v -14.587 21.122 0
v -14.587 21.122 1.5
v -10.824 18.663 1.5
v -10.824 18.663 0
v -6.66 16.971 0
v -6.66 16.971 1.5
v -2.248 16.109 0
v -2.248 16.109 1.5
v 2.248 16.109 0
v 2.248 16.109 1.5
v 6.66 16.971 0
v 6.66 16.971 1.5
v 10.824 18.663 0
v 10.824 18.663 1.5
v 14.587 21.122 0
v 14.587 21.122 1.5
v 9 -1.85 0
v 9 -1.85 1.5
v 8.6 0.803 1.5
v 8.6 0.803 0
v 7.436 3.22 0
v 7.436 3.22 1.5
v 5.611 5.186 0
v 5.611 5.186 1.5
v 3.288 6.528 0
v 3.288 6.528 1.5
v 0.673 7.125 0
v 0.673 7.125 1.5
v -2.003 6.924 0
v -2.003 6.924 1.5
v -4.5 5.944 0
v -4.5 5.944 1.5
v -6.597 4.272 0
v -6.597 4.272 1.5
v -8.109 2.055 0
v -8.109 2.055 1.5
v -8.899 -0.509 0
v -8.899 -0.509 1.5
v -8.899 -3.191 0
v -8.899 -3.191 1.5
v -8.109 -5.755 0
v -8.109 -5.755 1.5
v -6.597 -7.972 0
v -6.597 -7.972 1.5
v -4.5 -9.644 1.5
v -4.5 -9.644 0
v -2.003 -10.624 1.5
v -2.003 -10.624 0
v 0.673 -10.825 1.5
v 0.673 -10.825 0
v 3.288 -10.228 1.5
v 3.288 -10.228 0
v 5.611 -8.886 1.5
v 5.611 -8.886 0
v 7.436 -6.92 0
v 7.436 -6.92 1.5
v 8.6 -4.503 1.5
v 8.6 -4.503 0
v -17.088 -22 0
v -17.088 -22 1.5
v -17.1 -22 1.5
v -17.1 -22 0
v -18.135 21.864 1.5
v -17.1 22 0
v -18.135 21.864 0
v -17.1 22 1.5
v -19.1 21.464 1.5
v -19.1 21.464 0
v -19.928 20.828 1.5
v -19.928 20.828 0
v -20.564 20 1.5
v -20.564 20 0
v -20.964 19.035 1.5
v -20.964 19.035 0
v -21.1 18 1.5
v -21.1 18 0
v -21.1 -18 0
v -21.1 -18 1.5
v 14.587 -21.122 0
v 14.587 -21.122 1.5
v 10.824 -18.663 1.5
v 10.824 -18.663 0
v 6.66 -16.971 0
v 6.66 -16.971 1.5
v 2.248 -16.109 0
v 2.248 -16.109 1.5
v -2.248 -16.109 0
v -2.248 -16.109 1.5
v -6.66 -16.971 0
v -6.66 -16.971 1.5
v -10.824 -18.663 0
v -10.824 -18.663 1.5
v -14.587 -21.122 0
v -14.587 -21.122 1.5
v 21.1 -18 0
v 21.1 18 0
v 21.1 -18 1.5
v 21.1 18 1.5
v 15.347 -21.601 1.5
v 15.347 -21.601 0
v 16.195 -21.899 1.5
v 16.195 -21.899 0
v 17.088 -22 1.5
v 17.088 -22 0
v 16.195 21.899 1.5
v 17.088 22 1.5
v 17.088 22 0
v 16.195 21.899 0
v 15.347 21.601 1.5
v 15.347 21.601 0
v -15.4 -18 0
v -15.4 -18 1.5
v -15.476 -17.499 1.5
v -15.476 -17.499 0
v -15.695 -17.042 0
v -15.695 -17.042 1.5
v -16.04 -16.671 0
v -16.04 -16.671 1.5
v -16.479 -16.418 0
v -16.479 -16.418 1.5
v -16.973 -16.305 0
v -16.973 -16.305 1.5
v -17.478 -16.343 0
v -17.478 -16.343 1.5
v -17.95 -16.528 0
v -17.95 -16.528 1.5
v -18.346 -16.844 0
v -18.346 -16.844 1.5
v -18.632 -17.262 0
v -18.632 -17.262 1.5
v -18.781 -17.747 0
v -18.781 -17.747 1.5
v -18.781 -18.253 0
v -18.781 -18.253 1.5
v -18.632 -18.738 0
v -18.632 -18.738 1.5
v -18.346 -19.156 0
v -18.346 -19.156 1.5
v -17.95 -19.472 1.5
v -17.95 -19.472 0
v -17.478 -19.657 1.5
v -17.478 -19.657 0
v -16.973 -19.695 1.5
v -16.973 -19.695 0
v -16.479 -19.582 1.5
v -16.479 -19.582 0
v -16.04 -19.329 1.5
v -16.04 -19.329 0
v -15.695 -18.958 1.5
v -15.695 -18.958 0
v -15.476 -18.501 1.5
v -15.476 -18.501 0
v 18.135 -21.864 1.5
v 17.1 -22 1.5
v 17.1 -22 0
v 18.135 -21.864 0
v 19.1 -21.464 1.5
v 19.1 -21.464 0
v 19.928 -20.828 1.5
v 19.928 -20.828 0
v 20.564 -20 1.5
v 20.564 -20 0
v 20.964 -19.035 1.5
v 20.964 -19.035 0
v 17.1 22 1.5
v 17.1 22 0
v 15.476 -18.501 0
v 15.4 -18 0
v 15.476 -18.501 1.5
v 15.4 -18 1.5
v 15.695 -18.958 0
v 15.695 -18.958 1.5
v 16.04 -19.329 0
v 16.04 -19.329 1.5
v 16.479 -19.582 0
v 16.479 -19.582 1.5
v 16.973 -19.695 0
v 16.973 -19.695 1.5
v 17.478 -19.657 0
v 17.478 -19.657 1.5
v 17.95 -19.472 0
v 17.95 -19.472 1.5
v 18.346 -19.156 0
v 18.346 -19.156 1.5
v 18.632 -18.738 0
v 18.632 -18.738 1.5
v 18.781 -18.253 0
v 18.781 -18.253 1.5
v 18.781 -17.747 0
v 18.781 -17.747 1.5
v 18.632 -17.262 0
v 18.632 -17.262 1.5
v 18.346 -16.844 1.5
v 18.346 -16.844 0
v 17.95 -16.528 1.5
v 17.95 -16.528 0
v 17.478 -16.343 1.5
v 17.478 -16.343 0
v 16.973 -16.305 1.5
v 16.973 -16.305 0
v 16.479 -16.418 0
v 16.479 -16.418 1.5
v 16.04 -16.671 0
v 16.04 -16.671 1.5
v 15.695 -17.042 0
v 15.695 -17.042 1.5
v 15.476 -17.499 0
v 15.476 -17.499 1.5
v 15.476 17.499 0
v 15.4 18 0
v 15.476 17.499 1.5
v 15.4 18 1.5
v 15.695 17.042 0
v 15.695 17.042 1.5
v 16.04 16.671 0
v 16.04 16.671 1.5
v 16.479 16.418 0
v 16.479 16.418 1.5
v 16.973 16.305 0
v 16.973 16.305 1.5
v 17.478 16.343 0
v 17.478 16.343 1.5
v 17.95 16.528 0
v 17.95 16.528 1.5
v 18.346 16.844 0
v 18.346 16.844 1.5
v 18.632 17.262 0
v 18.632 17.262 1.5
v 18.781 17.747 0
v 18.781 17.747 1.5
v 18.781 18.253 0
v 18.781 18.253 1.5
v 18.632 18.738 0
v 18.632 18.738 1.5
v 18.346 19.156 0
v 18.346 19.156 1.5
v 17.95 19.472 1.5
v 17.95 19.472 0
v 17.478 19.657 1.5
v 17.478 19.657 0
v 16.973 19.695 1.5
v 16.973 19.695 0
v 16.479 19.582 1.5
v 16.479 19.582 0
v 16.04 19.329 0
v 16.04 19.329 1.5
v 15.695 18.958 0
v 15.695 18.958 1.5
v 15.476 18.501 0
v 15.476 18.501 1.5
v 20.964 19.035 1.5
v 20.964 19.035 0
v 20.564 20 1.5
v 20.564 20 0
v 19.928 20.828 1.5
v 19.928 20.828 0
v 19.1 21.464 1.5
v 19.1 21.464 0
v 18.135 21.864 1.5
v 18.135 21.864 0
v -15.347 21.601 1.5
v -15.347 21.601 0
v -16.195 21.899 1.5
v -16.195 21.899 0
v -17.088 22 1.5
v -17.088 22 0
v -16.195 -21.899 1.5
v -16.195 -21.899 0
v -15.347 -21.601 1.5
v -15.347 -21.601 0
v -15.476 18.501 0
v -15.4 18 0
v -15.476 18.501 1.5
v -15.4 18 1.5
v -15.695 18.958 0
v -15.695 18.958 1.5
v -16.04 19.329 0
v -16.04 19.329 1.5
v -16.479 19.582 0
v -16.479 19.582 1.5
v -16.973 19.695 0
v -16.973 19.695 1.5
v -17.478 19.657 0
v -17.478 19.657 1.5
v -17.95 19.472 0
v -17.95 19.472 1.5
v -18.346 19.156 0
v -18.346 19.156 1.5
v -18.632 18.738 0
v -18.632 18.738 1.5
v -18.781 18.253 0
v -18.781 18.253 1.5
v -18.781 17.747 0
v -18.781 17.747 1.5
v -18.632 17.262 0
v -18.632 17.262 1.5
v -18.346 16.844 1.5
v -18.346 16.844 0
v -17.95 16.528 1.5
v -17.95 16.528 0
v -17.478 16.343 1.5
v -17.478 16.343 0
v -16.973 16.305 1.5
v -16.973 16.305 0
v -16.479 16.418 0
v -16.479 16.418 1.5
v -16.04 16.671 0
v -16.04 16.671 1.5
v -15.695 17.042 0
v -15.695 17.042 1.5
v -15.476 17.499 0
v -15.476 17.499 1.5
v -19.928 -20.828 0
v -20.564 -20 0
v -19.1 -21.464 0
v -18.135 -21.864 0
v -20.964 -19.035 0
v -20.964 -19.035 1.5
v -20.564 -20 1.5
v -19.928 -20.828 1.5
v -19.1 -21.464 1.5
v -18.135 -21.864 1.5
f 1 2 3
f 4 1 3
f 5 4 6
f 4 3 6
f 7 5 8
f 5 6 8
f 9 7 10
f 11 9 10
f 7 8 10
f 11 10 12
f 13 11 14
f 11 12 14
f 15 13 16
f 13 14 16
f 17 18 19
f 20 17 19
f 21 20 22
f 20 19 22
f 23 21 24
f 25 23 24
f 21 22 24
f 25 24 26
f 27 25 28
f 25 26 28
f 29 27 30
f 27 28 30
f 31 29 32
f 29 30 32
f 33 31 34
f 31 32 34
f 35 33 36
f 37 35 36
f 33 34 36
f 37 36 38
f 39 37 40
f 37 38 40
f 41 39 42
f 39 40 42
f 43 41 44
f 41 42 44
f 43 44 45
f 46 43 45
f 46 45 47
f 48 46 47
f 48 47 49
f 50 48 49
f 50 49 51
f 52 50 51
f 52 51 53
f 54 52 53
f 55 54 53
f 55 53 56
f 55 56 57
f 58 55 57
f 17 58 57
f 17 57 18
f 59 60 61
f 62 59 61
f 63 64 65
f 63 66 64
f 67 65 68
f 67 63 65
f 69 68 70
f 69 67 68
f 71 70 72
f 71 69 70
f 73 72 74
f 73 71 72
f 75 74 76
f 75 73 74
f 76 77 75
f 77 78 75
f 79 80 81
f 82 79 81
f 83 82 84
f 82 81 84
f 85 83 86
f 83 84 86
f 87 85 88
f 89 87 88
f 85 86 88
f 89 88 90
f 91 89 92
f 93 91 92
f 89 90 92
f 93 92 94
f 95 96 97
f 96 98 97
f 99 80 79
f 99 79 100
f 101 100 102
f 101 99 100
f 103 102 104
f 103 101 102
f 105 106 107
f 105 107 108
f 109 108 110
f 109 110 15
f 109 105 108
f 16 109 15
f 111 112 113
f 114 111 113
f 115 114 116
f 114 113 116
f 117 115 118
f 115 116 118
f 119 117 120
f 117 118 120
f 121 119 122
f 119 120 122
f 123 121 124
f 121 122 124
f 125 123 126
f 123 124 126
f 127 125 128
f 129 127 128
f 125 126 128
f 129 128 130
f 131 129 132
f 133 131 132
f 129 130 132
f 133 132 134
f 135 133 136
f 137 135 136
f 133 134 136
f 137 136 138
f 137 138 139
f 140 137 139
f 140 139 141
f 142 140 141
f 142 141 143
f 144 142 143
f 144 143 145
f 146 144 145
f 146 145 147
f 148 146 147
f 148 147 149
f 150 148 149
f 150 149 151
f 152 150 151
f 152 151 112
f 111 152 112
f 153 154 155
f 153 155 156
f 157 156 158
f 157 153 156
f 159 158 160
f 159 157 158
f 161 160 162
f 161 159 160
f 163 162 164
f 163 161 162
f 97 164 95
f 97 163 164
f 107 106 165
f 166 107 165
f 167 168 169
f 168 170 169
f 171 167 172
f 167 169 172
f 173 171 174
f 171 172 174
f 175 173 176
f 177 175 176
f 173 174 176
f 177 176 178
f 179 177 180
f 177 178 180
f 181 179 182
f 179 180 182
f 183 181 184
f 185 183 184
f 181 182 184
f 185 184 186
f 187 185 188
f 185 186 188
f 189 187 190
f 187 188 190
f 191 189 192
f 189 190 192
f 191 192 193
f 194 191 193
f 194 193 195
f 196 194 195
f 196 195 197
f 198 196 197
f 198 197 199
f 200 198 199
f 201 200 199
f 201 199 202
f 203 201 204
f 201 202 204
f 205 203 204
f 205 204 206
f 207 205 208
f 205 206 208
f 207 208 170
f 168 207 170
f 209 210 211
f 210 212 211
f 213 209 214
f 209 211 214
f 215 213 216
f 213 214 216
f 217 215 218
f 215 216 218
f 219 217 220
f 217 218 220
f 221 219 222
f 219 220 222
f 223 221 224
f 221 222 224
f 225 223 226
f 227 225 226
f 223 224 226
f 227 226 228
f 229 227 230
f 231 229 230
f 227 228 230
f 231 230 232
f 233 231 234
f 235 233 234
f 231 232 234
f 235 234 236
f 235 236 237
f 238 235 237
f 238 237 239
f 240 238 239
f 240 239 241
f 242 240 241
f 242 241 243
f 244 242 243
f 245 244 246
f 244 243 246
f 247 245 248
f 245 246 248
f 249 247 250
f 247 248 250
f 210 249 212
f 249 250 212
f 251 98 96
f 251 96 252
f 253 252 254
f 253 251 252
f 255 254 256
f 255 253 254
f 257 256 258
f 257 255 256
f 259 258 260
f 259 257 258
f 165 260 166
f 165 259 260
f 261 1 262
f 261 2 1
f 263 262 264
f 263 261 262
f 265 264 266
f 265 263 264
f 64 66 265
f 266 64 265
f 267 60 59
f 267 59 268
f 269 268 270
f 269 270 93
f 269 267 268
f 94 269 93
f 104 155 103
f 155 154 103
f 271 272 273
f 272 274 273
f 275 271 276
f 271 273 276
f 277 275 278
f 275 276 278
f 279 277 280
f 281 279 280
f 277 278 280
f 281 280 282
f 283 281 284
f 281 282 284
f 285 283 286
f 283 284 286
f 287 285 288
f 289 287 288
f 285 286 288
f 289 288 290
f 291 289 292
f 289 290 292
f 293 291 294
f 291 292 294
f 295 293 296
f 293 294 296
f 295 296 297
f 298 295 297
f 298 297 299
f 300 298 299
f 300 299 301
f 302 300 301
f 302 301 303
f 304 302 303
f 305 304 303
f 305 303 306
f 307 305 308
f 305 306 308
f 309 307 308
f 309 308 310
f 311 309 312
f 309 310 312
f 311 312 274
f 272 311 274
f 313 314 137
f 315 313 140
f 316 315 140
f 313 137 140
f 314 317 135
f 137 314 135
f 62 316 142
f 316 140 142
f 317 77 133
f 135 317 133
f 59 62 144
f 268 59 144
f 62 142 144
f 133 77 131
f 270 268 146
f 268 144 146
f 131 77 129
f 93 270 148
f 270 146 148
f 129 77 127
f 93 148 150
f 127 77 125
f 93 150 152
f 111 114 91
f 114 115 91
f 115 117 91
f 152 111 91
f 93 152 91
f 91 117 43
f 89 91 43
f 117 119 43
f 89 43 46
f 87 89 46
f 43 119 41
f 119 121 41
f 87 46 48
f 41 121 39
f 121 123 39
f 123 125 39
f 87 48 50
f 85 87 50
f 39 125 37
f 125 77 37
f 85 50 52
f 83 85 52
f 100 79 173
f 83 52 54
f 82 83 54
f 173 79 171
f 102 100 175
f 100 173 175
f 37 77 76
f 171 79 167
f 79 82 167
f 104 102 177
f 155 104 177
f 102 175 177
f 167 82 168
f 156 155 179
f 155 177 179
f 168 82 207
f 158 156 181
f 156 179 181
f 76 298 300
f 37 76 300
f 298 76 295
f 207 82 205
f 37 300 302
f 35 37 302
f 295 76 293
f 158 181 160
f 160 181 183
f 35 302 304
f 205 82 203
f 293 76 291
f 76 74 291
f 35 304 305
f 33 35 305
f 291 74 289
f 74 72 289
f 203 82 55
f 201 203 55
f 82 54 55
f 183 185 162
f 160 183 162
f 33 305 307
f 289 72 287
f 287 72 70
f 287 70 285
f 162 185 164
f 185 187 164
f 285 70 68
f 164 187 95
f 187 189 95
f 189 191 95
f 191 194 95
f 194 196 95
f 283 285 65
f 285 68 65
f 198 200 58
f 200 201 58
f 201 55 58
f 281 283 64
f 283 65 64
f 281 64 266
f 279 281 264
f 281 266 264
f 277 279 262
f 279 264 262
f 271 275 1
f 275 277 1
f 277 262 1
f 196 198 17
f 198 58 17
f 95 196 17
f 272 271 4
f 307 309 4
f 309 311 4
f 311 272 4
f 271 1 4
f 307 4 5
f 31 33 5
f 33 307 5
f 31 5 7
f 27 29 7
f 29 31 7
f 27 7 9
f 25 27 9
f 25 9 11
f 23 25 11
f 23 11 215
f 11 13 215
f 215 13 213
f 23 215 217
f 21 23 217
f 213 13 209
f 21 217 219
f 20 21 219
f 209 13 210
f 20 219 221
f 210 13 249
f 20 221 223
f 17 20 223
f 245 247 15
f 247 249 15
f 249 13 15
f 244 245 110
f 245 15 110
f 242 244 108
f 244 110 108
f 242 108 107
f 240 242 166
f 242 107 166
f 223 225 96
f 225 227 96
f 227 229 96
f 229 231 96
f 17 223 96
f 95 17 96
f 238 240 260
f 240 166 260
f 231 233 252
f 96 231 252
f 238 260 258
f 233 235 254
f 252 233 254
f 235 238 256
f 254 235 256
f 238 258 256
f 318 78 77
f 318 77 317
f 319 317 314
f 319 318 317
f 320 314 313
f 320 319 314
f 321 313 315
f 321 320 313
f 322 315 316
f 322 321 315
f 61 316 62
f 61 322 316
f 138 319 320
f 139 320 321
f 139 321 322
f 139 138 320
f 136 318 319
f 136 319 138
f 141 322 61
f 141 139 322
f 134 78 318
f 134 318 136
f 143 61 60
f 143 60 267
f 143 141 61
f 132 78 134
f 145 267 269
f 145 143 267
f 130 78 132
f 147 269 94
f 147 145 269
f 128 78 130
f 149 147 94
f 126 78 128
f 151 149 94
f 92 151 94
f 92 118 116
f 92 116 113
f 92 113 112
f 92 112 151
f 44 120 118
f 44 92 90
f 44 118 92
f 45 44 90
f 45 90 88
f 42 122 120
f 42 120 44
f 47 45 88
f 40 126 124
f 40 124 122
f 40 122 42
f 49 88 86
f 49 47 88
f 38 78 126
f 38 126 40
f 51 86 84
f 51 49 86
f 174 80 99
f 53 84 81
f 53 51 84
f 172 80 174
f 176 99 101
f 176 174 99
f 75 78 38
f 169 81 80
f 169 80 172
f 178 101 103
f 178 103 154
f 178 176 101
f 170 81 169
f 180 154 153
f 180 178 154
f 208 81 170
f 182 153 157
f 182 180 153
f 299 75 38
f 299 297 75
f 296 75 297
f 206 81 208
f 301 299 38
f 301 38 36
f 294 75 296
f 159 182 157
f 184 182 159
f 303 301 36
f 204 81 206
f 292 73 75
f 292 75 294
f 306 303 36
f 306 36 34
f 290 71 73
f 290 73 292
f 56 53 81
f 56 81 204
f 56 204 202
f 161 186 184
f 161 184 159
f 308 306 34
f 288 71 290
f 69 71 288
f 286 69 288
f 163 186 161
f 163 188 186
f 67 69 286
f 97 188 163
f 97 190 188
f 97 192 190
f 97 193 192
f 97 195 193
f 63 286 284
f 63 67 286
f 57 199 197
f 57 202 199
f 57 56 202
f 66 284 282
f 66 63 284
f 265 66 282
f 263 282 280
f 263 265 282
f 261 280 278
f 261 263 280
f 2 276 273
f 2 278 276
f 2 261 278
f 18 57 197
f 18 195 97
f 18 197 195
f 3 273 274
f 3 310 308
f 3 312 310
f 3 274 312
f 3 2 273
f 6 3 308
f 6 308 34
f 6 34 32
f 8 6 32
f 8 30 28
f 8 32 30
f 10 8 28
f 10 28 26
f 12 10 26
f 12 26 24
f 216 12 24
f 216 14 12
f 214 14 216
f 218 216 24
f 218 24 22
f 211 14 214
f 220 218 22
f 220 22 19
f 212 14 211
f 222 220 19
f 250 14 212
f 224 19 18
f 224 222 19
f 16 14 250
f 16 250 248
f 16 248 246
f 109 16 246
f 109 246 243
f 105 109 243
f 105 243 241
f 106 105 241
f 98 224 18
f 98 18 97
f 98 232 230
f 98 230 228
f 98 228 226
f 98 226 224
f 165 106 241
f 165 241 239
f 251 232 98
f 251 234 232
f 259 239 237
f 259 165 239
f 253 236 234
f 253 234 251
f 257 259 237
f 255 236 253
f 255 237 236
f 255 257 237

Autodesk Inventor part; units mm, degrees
ref_plane "YZ Plane" through (0, 0, 0) normal (1, 0, 0) x (0, 1, 0)
ref_plane "XZ Plane" through (0, 0, 0) normal (0, 1, 0) x (-1, 0, 0)
ref_plane "XY Plane" through (0, 0, 0) normal (0, 0, 1) x (1, 0, 0)
sketch "Sketch3" plane through (0, 0, 0) normal (0, 0, 1) x (1, 0, 0)
  line L0 (-20.1, 21) -> (20.1, 21)
  line L1 (20.1, 21) -> (20.1, -21)
  line L2 (20.1, -21) -> (-20.1, -21)
  line L3 (-20.1, -21) -> (-20.1, 21)
  line L4 (-20.1, 21) -> (20.1, -21) construction
  line L5 (20.1, 21) -> (-20.1, -21) construction
  point P0 (0, 0)
  dimension "d24" = 40.2
  dimension "d25" = 42
extrude "Extrusion3" add sketch "Sketch3" along normal blind 1.5
sketch "Sketch4" plane through (0, 0, 1.5) normal (0, 0, 1) x (1, 0, 0)
  line L0 (20.1, 21) -> (-20.1, 21) projected
  line L1 (-20.1, 21) -> (-17.1, 21) construction
  line L2 (-17.1, 21) -> (-17.1, 18) construction
  line L3 (-17.1, 18) -> (-20.1, 18) construction
  line L4 (-20.1, 18) -> (-20.1, 21) construction
  circle A0 centre (-17.1, 18) radius 1.7
  point P0 (0, 0)
  dimension "d28" = 3
  dimension "d29" = 3
  dimension "d30" = 3.4
extrude "Extrusion4" cut sketch "Sketch4" against normal through all
fillet "Fillet2" radius 3 1 edges at (-20.1, 21, 0.75)
mirror "Mirror2" about plane through (0, 0, 0) normal (0, 1, 0) of "Fillet2", "Extrusion4"
mirror "Mirror3" about plane through (0, 0, 0) normal (1, 0, 0) of "Fillet2", "Extrusion4", "Mirror2"
sketch "Sketch5" plane through (0, 0, 1.5) normal (0, 0, 1) x (1, 0, 0)
  circle A0 centre (-17.1, 18) radius 1.7 construction
  circle A1 centre (17.1, 18) radius 1.7 construction
  line L0 (-17.1, 18) -> (17.1, 18) construction
  line L1 (17.1, 18) -> (17.1, 15) construction
  line L2 (17.1, 15) -> (-17.1, 15) construction
  line L3 (-17.1, 15) -> (-17.1, 18) construction
  arc A2 (-17.1, 21) -> (-20.1, 18) centre (-17.1, 18) ccw projected
  line L4 (-17.1, 18) -> (-17.1, 21) construction
  line L5 (17.1, 21) -> (-17.1, 21) construction
  line L6 (17.1, 18) -> (17.1, 21) construction
  arc A3 (20.1, 18) -> (17.1, 21) centre (17.1, 18) ccw construction
  line L7 (17.1, 21) -> (-17.1, 21) construction
  line L8 (-17.1, 18) -> (-17.1, 21) construction
  line L9 (-17.1, 21) -> (-16, 21) construction
  line L10 (-16, 21) -> (-16, 18) construction
  line L11 (-16, 18) -> (-17.1, 18) construction
  line L12 (17.1, 18) -> (17.1, 21) construction
  line L13 (17.1, 21) -> (16, 21) construction
  line L14 (16, 21) -> (16, 18) construction
  line L15 (16, 18) -> (17.1, 18) construction
  arc A4 (-16, 21) -> (16, 21) centre (0, 39.3333) ccw
  line L16 (-16, 21) -> (16, 21)
  point P0 (0, 0)
  point P1 (0, 15)
  dimension "d34" = 3
  dimension "d42" = 1.1
  dimension "d43" = 1.1
extrude "Extrusion5" cut sketch "Sketch5" against normal through all
mirror "Mirror4" about plane through (0, 0, 0) normal (0, 1, 0) of "Extrusion5"
fillet "Fillet3" radius 3 4 edges at (-16, 21, 0.75) (16, 21, 0.75) (16, -21, 0.75) (-16, -21, 0.75)
sketch "Sketch7" plane through (0, 0, 1.5) normal (0, 0, 1) x (1, 0, 0)
  line L0 (15.3, 7.9) -> (15.3, -11.6) construction
  line L1 (15.3, -11.6) -> (-15.4, -11.6) construction
  line L2 (-15.4, -11.6) -> (-15.4, 7.9) construction
  line L3 (-15.4, 7.9) -> (15.3, 7.9) construction
  line L4 (-17.65, -15) -> (30.6, -15) construction
  line L5 (30.6, -15) -> (30.6, 15) construction
  line L6 (30.6, 15) -> (-30.1, 15) construction
  line L7 (-30.1, 15) -> (-30.1, 10) construction
  line L8 (-17.65, 10) -> (-30.1, 10) construction
  line L9 (-17.65, 10) -> (-17.65, -15) construction
  line L10 (15.3, -11.6) -> (-15.4, 7.9) construction
  line L11 (-15.4, -11.6) -> (15.3, 7.9) construction
  line L12 (0, 0) -> (-0.05, 0) construction
  line L13 (-0.05, 0) -> (-0.05, -1.85) construction
  line L14 (-0.05, -1.85) -> (0, -1.85) construction
  line L15 (0, -1.85) -> (0, 0) construction
  circle A0 centre (0, -1.85) radius 9
  dimension "d41" = 18
extrude "Extrusion6" cut sketch "Sketch7" against normal through all
sketch "Sketch8" plane through (0, 0, 1.5) normal (0, 0, 1) x (1, 0, 0)
  circle A0 centre (0, -1.85) radius 9 projected
  arc A1 (-17.088, -21) -> (-15.2125, -20.3415) centre (-17.088, -18) ccw projected
  arc A2 (15.2125, -20.3415) -> (-15.2125, -20.3415) centre (0, -39.3333) ccw projected
  arc A3 (15.2125, -20.3415) -> (17.088, -21) centre (17.088, -18) ccw projected
  line L0 (17.088, -21) -> (17.1, -21) projected
  arc A4 (17.1, -21) -> (20.1, -18) centre (17.1, -18) ccw projected
  line L1 (20.1, -18) -> (20.1, 18) projected
  arc A5 (20.1, 18) -> (17.1, 21) centre (17.1, 18) ccw projected
  line L2 (17.1, 21) -> (17.088, 21) projected
  arc A6 (17.088, 21) -> (15.2125, 20.3415) centre (17.088, 18) ccw projected
  arc A7 (-15.2125, 20.3415) -> (15.2125, 20.3415) centre (0, 39.3333) ccw projected
  arc A8 (-15.2125, 20.3415) -> (-17.088, 21) centre (-17.088, 18) ccw projected
  line L3 (-17.088, 21) -> (-17.1, 21) projected
  arc A9 (-17.1, 21) -> (-20.1, 18) centre (-17.1, 18) ccw projected
  line L4 (-20.1, 18) -> (-20.1, -18) projected
  arc A10 (-20.1, -18) -> (-17.1, -21) centre (-17.1, -18) ccw projected
  line L5 (-17.1, -21) -> (-17.088, -21) projected
  circle A11 centre (17.1, -18) radius 1.7 projected
  circle A12 centre (17.1, 18) radius 1.7 projected
  circle A13 centre (-17.1, -18) radius 1.7 projected
  circle A14 centre (-17.1, 18) radius 1.7 projected
  line L6 (21.1, 18) -> (21.1, -18)
  arc A15 (17.1, -22) -> (21.1, -18) centre (17.1, -18) ccw
  line L7 (17.1, -22) -> (17.088, -22)
  arc A16 (14.5873, -21.122) -> (17.088, -22) centre (17.088, -18) ccw
  arc A17 (14.5873, -21.122) -> (-14.5873, -21.122) centre (0, -39.3333) ccw
  arc A18 (-17.088, -22) -> (-14.5873, -21.122) centre (-17.088, -18) ccw
  line L8 (-17.088, -22) -> (-17.1, -22)
  arc A19 (-21.1, -18) -> (-17.1, -22) centre (-17.1, -18) ccw
  line L9 (-21.1, -18) -> (-21.1, 18)
  arc A20 (-17.1, 22) -> (-21.1, 18) centre (-17.1, 18) ccw
  line L10 (-17.1, 22) -> (-17.088, 22)
  arc A21 (-14.5873, 21.122) -> (-17.088, 22) centre (-17.088, 18) ccw
  arc A22 (-14.5873, 21.122) -> (14.5873, 21.122) centre (0, 39.3333) ccw
  arc A23 (17.088, 22) -> (14.5873, 21.122) centre (17.088, 18) ccw
  line L11 (17.088, 22) -> (17.1, 22)
  arc A24 (21.1, 18) -> (17.1, 22) centre (17.1, 18) ccw
  point P0 (0, 0)
  dimension "d44" = 1
extrude "Extrusion7" add sketch "Sketch8" against normal up to surface (1.5 mm away) contours L6 A15 L7 A16 A17 A18 L8 A19 L9 A20 L10 A21 A22 A23 L11 A24
equation "\"d43\" = d42"
properties part number "seal"
